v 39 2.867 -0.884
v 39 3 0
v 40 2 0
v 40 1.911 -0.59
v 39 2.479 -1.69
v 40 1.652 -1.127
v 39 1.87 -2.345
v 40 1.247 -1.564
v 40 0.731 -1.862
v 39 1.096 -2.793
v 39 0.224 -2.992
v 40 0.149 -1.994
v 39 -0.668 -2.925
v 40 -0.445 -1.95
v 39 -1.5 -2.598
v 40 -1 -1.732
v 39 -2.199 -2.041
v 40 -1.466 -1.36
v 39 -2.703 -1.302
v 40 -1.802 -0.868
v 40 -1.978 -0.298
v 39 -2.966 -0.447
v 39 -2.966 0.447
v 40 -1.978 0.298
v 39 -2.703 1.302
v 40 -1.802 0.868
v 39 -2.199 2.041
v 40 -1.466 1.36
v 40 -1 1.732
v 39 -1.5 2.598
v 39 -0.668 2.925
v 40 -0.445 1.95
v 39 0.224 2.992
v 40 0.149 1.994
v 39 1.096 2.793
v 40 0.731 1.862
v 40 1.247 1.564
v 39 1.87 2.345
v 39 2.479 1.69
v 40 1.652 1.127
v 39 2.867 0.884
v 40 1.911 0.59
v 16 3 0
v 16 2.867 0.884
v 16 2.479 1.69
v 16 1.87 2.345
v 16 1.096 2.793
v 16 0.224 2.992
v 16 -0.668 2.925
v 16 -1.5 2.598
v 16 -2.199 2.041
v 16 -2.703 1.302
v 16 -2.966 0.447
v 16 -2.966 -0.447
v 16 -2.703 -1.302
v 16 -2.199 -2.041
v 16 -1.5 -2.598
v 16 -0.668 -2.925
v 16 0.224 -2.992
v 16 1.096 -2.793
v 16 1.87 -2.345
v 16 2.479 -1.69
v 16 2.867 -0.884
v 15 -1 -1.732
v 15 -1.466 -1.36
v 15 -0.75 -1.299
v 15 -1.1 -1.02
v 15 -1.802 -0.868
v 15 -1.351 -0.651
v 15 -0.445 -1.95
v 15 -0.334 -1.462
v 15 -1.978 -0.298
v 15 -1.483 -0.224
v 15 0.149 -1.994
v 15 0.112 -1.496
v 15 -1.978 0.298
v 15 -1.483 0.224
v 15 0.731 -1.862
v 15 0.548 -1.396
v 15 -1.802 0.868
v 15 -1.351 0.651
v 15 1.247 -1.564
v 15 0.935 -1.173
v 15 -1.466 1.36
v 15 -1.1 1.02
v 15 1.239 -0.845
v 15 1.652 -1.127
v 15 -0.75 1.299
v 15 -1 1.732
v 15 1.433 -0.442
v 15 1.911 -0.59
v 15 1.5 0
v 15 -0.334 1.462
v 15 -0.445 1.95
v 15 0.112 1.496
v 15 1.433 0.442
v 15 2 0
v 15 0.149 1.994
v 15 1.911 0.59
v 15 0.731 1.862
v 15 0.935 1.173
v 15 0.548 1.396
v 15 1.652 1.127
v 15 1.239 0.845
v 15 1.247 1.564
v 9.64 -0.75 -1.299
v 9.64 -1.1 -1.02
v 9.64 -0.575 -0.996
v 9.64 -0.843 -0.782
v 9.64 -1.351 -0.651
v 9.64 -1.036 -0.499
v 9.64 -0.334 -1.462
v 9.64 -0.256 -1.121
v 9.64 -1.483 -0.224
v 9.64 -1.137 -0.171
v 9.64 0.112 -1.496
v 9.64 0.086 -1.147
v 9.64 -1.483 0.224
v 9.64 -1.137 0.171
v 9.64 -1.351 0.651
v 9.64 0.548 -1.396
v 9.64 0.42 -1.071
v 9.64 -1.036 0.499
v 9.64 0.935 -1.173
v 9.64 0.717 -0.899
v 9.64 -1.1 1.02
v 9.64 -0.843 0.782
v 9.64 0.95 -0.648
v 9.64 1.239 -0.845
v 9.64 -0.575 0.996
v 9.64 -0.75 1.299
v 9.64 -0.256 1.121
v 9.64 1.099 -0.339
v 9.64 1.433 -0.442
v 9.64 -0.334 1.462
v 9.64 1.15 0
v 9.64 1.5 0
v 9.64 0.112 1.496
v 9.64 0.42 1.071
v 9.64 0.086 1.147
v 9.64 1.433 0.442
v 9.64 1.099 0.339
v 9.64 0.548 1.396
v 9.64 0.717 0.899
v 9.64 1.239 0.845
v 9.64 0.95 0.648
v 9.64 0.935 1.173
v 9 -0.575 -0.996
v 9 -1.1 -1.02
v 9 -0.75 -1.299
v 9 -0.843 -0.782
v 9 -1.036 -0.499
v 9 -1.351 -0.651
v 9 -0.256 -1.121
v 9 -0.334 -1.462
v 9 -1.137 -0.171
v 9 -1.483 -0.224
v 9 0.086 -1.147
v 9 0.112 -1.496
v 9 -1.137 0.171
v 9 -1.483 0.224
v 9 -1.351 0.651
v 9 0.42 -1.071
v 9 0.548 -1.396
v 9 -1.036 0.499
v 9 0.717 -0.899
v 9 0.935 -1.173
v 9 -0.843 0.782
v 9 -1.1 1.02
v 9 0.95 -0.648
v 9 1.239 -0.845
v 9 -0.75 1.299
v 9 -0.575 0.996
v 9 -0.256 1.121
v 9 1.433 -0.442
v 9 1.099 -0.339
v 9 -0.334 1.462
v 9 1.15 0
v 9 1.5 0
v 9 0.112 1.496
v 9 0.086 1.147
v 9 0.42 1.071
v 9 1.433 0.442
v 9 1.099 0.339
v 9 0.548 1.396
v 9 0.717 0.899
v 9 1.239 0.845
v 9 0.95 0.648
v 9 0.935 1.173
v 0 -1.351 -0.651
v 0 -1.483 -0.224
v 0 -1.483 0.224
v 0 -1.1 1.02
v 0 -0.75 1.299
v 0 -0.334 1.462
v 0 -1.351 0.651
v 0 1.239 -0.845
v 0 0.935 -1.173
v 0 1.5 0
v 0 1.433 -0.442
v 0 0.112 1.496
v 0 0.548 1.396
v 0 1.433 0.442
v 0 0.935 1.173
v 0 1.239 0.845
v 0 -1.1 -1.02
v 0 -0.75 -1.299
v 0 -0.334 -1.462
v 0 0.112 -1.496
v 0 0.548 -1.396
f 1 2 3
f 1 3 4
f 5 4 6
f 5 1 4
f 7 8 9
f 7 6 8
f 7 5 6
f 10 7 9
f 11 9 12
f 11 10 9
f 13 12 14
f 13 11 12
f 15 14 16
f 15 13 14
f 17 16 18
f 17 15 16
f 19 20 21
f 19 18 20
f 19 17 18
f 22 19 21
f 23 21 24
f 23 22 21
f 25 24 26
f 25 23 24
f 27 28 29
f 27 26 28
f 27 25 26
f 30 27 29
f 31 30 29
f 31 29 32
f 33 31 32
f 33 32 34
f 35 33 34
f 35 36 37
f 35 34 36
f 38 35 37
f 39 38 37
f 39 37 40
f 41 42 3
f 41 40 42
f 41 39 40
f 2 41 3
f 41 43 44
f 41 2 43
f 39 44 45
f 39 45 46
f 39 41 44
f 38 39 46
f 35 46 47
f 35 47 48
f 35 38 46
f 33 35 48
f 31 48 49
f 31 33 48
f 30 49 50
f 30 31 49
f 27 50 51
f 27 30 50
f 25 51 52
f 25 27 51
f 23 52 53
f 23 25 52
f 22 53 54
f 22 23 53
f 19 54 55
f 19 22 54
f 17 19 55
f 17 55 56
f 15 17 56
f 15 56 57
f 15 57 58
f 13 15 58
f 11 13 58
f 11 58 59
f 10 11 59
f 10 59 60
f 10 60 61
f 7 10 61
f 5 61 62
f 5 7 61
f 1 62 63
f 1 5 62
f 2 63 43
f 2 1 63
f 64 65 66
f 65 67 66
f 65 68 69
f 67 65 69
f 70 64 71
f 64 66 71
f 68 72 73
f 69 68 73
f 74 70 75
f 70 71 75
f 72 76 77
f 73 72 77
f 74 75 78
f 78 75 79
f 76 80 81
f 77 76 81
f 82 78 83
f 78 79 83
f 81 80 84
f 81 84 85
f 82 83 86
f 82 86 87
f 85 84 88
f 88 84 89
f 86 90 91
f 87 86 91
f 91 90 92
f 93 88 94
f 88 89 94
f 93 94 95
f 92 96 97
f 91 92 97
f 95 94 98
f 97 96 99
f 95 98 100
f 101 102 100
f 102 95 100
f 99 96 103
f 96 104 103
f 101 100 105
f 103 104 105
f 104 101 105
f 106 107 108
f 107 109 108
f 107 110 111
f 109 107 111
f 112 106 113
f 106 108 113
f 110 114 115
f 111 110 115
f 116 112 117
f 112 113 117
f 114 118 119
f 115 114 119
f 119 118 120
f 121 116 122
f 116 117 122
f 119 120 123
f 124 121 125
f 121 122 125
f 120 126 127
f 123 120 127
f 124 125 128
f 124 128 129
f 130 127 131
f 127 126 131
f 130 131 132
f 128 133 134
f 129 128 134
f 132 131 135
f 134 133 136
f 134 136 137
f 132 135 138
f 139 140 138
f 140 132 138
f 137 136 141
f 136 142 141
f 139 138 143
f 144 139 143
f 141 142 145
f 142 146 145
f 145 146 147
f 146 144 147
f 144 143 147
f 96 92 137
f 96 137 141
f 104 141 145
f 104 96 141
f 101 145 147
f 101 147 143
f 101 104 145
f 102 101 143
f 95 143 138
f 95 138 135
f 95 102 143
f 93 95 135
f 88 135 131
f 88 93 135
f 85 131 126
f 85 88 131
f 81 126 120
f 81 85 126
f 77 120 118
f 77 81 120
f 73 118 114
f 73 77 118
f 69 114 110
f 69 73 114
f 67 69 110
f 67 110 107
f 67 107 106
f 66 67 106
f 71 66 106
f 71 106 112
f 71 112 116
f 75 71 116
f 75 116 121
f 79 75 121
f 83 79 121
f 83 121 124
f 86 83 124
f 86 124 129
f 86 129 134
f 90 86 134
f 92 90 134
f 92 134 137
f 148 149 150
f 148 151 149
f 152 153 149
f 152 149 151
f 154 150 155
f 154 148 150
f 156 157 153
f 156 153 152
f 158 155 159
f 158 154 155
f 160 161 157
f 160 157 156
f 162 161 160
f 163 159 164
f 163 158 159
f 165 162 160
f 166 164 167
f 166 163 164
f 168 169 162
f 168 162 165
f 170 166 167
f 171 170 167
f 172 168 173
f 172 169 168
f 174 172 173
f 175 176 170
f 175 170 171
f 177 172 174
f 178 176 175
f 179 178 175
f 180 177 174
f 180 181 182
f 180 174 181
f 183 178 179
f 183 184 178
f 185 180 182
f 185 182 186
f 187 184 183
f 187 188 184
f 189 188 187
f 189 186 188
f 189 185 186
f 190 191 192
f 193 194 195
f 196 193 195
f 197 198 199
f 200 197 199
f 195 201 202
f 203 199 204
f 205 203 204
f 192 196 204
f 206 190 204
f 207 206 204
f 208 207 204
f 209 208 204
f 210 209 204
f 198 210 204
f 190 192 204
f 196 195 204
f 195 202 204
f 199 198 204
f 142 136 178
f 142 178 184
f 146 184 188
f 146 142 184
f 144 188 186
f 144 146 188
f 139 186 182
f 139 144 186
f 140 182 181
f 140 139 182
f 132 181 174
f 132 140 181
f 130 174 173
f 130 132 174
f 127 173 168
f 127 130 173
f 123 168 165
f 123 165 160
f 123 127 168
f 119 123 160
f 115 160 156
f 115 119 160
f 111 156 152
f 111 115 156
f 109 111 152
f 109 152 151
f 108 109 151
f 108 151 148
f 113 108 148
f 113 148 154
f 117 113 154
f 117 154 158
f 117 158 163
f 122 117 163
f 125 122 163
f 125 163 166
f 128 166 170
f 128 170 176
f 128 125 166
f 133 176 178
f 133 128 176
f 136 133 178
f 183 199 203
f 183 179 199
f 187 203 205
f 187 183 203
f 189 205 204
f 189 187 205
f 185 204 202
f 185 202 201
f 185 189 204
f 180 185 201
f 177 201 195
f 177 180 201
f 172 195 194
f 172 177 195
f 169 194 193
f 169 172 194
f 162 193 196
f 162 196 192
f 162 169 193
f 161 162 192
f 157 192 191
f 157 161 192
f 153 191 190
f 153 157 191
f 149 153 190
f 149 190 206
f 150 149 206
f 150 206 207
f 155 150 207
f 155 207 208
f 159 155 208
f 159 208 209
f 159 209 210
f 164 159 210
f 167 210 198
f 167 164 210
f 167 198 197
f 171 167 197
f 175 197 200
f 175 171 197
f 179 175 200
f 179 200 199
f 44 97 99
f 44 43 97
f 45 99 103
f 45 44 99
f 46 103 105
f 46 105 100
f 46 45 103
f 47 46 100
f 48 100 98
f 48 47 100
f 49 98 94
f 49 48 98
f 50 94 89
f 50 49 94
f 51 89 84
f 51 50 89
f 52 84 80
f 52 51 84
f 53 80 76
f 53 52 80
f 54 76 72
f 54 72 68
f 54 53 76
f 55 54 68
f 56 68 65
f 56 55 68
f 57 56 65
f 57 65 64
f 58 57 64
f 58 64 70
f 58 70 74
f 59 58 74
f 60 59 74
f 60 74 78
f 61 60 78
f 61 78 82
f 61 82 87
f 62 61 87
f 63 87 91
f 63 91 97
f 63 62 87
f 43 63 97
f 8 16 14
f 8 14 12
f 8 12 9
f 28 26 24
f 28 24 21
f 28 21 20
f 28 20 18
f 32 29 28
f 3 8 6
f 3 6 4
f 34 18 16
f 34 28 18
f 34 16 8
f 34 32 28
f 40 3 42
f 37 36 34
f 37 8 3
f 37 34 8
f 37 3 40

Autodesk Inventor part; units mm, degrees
ref_plane "YZ Plane" through (0, 0, 0) normal (1, 0, 0) x (0, 1, 0)
ref_plane "XZ Plane" through (0, 0, 0) normal (0, 1, 0) x (-1, 0, 0)
ref_plane "XY Plane" through (0, 0, 0) normal (0, 0, 1) x (1, 0, 0)
sketch "Skizze1" plane through (0, 0, 0) normal (0, 0, 1) x (1, 0, 0)
  line L0 (-8, 0) -> (48, 0) projected
  line L1 (0, -0.6) -> (0, 3.6) projected
  line L2 (0, 1.5) -> (9, 1.5)
  line L3 (9, 1.15) -> (9.64, 1.15)
  line L4 (9.64, 1.15) -> (9.64, 1.5)
  line L5 (9.64, 1.5) -> (15, 1.5)
  line L6 (15, 1.5) -> (15, 3)
  line L7 (15, 3) -> (40, 3)
  line L8 (40, 3) -> (40, 0)
  line L9 (40, 0) -> (0, 0)
  line L10 (0, 0) -> (0, 1.5)
  line L11 (9, 1.5) -> (9, 1.15)
  dimension "d0" = 3
  dimension "d1" = 2.3
  dimension "d2" = 9
  dimension "d3" = 0.64
  dimension "d4" = 3
  dimension "d5" = 15
  dimension "d6" = 40
  dimension "d7" = 6
revolve "Umdrehung1" add sketch "Skizze1" angle 360 about axis through (-10, 0, 0) along (1, 0, 0)
thread "Gewinde2" size "M3x0.5" class "6g" standard "ANSI Metric M Profile" length 7
chamfer "Fase1" distance 1 angle 45 2 edges at (15, -3, 0) (40, -3, 0)
properties part number "13_1087_035"
